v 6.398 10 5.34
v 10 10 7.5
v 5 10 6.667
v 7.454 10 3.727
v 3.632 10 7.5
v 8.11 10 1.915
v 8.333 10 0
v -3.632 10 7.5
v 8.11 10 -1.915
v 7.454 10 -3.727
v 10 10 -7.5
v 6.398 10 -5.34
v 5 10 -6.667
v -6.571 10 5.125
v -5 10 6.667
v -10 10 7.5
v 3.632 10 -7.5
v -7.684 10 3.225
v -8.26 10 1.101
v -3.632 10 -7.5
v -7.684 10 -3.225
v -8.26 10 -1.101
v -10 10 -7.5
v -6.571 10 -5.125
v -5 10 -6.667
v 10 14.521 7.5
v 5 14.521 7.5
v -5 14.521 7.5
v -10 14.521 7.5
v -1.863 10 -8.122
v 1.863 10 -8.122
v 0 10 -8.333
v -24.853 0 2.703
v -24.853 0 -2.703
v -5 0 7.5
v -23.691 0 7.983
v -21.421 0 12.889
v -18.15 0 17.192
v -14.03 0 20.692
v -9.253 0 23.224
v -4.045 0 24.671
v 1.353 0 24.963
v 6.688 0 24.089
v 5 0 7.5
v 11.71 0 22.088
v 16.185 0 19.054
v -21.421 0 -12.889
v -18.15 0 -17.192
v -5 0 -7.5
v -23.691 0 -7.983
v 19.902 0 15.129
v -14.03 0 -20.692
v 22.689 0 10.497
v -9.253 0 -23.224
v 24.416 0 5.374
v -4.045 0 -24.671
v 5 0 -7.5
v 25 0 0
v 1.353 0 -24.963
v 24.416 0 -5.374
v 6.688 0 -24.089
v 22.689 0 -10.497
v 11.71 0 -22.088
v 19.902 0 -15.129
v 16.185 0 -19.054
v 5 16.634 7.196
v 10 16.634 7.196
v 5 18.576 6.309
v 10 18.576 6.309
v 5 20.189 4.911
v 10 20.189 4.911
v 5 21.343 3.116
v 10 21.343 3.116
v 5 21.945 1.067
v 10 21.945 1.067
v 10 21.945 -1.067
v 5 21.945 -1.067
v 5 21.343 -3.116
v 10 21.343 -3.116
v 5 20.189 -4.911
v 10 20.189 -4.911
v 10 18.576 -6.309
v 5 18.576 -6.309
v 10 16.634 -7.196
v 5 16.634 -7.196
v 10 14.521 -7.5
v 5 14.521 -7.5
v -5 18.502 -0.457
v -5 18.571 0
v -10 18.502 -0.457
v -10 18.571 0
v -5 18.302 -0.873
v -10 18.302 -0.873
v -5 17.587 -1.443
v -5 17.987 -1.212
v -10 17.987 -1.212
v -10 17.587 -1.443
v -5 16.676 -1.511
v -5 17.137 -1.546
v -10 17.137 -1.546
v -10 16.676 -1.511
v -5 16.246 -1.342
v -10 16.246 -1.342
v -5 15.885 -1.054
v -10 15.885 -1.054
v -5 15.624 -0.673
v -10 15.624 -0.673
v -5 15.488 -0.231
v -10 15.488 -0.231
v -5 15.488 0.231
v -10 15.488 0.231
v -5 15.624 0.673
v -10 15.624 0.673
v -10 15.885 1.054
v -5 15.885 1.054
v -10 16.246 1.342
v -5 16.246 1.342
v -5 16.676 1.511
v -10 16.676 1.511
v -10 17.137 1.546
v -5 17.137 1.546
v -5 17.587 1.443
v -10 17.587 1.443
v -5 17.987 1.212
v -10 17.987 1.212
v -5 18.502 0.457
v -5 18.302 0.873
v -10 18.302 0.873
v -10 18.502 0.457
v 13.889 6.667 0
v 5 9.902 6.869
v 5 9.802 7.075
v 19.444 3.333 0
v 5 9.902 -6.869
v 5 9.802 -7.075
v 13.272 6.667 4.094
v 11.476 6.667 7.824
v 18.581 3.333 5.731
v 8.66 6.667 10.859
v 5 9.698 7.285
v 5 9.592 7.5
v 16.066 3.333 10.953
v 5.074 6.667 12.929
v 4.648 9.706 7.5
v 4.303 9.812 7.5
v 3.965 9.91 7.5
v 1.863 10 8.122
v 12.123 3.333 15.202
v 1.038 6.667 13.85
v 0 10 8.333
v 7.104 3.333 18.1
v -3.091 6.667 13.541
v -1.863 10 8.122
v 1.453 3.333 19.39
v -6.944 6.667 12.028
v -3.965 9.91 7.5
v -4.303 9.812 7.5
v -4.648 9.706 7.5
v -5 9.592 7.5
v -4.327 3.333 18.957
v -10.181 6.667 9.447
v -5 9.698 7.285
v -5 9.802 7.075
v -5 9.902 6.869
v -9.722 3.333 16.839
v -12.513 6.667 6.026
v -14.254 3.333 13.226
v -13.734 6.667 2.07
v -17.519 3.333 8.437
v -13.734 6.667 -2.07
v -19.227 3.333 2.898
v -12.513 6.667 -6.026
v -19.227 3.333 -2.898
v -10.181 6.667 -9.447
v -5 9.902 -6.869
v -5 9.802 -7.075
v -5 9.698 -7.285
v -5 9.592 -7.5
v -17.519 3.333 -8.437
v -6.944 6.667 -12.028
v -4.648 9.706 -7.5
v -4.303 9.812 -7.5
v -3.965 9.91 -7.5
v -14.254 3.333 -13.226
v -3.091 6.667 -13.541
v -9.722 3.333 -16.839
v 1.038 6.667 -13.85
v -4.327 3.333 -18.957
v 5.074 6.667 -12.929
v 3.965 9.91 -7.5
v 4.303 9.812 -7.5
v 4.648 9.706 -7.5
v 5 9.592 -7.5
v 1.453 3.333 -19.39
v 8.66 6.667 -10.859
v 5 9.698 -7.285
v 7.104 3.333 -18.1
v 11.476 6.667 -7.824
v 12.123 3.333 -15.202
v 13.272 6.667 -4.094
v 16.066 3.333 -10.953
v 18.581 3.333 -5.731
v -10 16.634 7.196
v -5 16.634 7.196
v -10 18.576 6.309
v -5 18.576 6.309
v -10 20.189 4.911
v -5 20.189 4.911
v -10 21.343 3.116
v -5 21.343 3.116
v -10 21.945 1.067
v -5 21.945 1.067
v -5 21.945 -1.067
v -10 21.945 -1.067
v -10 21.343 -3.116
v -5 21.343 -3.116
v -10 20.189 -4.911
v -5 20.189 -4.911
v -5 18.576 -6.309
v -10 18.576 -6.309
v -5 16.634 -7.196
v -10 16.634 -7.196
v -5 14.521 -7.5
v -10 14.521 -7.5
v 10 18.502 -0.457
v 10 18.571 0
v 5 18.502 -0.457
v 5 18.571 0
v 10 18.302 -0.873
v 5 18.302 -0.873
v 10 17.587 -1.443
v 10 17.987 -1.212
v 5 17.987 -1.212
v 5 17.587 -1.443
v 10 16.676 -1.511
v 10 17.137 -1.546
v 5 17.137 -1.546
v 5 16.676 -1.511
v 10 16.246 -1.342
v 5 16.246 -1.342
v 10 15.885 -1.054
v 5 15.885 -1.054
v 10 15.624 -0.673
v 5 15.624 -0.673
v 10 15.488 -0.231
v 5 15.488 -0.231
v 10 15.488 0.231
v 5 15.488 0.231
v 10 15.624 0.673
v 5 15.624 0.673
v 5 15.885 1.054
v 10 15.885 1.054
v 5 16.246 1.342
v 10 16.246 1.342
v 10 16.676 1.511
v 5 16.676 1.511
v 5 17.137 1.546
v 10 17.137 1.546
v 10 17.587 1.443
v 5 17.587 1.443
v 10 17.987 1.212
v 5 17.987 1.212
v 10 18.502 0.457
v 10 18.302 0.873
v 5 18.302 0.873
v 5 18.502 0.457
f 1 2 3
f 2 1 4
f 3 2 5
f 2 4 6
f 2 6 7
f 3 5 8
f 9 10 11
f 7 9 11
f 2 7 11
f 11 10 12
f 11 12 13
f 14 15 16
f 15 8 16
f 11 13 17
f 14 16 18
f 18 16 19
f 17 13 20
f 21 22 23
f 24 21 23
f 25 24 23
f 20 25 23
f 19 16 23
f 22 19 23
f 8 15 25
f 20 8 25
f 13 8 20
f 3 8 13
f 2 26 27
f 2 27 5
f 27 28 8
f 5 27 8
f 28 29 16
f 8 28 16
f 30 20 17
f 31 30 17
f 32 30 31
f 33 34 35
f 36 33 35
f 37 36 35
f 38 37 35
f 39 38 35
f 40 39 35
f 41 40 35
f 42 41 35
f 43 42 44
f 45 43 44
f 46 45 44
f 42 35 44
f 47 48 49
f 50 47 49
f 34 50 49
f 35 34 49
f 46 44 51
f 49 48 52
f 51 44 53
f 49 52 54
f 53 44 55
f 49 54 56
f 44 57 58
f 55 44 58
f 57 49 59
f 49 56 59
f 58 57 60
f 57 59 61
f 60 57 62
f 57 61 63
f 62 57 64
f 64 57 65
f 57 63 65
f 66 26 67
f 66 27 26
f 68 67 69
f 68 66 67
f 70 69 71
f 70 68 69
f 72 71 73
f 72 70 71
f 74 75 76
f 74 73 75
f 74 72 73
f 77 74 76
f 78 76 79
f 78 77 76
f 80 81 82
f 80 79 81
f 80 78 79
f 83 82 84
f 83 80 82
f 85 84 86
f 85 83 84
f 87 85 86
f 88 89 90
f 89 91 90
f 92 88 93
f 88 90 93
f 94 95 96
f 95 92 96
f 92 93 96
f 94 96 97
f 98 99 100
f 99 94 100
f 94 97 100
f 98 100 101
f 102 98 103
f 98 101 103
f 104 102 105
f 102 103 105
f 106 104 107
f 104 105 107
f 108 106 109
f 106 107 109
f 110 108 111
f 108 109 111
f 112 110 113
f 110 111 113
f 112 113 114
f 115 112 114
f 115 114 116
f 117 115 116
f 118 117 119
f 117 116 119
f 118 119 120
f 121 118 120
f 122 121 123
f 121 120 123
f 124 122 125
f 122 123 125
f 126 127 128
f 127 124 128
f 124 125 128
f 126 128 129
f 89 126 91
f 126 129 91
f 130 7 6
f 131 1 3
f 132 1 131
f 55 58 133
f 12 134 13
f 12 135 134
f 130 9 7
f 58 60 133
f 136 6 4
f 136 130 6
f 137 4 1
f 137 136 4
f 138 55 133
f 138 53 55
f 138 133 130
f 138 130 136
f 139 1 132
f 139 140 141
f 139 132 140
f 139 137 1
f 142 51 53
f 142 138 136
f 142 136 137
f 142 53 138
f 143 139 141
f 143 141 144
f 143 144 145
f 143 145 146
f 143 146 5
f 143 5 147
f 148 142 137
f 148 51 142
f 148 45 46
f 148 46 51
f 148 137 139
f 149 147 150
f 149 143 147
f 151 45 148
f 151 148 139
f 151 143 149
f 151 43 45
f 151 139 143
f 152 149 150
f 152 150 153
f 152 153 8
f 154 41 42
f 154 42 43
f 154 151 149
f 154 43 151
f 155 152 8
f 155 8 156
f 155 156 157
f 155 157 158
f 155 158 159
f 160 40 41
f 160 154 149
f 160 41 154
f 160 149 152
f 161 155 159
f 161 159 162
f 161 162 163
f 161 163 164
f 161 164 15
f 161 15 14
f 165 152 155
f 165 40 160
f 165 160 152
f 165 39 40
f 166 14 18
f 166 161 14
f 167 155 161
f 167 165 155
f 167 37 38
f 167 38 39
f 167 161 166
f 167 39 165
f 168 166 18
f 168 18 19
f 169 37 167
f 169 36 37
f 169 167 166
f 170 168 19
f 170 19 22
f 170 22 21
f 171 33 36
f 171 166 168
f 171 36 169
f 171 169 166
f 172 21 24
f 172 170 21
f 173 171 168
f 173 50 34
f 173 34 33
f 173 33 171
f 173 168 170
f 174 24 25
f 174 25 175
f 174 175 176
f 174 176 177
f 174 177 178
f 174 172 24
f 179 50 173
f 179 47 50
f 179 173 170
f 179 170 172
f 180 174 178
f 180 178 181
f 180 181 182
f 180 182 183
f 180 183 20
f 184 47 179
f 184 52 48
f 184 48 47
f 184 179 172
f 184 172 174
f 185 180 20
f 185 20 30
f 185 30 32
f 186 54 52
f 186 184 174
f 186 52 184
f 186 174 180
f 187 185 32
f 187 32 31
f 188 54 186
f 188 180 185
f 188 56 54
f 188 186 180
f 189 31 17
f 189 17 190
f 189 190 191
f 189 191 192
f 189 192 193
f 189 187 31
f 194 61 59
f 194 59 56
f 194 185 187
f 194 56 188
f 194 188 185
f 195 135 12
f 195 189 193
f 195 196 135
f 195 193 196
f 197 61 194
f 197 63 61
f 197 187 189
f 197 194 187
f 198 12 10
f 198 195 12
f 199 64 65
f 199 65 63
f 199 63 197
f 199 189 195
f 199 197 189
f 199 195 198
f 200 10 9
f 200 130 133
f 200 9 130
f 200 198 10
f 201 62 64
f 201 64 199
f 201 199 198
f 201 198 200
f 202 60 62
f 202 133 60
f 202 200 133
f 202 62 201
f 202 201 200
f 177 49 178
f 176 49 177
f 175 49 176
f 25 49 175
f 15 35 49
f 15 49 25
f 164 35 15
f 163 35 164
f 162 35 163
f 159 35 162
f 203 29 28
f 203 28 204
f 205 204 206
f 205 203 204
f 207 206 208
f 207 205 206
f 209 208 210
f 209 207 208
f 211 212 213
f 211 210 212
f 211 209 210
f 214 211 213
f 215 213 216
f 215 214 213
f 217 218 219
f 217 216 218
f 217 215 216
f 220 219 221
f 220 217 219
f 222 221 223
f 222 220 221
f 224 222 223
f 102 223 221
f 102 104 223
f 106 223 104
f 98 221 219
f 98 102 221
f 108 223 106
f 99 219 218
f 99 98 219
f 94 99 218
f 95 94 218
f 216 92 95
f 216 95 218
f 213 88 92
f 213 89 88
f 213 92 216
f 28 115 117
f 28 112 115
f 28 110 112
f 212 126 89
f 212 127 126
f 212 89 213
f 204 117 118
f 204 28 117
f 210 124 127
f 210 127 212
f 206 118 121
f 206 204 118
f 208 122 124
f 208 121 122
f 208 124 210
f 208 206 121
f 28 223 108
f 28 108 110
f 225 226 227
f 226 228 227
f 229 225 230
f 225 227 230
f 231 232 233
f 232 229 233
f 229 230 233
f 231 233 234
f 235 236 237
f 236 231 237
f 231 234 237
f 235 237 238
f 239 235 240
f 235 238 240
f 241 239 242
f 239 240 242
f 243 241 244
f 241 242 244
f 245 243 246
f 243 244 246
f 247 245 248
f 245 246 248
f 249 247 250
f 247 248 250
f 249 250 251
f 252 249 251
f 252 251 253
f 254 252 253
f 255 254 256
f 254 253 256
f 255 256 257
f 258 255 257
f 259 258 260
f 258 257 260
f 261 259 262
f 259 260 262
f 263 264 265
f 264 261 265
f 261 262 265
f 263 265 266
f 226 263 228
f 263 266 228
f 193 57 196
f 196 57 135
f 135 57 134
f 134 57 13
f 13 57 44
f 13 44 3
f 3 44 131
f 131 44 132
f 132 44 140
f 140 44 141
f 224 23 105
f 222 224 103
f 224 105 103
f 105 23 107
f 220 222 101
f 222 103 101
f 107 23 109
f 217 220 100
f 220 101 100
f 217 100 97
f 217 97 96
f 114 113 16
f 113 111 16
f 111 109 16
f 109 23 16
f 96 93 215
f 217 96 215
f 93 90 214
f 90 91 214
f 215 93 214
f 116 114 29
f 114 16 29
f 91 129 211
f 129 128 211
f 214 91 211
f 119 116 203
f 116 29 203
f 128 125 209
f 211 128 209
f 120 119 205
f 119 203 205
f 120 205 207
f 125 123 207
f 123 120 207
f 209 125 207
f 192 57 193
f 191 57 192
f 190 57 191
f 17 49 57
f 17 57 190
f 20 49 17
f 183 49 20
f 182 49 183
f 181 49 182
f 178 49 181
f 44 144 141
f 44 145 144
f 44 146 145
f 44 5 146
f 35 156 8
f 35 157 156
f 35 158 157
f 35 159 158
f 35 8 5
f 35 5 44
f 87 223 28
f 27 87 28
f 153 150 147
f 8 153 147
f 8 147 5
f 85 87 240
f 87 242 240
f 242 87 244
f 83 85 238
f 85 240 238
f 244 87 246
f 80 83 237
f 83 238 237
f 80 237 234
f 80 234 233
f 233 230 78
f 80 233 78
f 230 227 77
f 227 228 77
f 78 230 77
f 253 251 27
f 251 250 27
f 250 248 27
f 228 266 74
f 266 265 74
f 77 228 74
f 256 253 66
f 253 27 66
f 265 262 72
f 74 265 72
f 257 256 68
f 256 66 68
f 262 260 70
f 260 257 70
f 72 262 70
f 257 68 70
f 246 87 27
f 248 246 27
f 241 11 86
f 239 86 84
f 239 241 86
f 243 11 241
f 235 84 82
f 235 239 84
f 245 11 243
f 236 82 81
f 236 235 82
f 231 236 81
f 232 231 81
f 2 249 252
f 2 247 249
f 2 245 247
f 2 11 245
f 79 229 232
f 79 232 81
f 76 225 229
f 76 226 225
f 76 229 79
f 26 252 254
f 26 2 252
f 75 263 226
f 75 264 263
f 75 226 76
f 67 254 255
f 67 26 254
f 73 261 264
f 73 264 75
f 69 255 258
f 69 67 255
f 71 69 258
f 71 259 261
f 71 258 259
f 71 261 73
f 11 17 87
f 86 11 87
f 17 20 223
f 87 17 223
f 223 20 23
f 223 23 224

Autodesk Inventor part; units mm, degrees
ref_plane "YZ Plane" through (0, 0, 0) normal (1, 0, 0) x (0, 1, 0)
ref_plane "XZ Plane" through (0, 0, 0) normal (0, 1, 0) x (-1, 0, 0)
ref_plane "XY Plane" through (0, 0, 0) normal (0, 0, 1) x (1, 0, 0)
sketch "Эскиз2" plane through (0, 0, 0) normal (0, 0, 1) x (1, 0, 0)
  line L0 (0, 0) -> (25, 0)
  line L1 (0, 0) -> (0, 15)
  line L2 (0, 15) -> (25, 0)
  line L3 (0, -3) -> (0, 18) projected
  dimension "d0" = 25
  dimension "d1" = 15
revolve "Вращение1" add sketch "Эскиз2" angle 360 about axis through (0, -10, 0) along (0, 1, 0)
ref_plane "РабПлоскость1" through (0, 10, 0) normal (0, -1, 0) x (1, 0, 0)
sketch "Эскиз3" plane through (0, 10, 0) normal (0, -1, 0) x (1, 0, 0)
  line L0 (9.9198, 18.1472) -> (-9.6073, 18.1472)
  line L1 (-9.6073, 18.1472) -> (-9.6073, -14.8146)
  line L2 (-9.6073, -14.8146) -> (9.9198, -14.8146)
  line L3 (9.9198, -14.8146) -> (9.9198, 18.1472)
  point P0 (0, 0)
extrude "Выдавливание1" cut sketch "Эскиз3" against normal blind 10
sketch "Эскиз4" plane through (0, 0, 0) normal (1, 0, 0) x (0, 1, 0)
  line L0 (14.521, 7.5) -> (0, 7.5)
  line L1 (0, 7.5) -> (0, -7.5)
  line L2 (0, -7.5) -> (14.521, -7.5)
  line L3 (14.521, -7.5) -> (14.521, 7.5)
  line L4 (14.521, 7.5) -> (0, -7.5) construction
  line L5 (0, 7.5) -> (14.521, -7.5) construction
  line L6 (10, 8.3333) -> (10, -8.3333) projected
  arc A0 (7.0249, 0.2433) -> (7.0249, -0.2433) centre (14.521, 0) ccw
  arc A1 (14.521, -7.5) -> (14.521, 7.5) centre (14.521, 0) ccw
  line L7 (14.521, 0) -> (17.021, 0) construction
  circle A2 centre (17.021, 0) radius 1.55
  point P0 (0, 0)
  point P1 (7.2605, 0)
  point P2 (10, 7.5)
  point P3 (10, -7.5)
  dimension "d6" = 15
  dimension "d7" = 4.521
  dimension "d10" = 2.5
  dimension "d11" = 3.1
extrude "Выдавливание2" add sketch "Эскиз4" along normal mid plane 20 contours L3 L2 L6 L0 | A1 L3
extrude "Выдавливание3" cut sketch "Эскиз4" along normal mid plane 10 contours A1 L3 | L6 L2 L1 L0
